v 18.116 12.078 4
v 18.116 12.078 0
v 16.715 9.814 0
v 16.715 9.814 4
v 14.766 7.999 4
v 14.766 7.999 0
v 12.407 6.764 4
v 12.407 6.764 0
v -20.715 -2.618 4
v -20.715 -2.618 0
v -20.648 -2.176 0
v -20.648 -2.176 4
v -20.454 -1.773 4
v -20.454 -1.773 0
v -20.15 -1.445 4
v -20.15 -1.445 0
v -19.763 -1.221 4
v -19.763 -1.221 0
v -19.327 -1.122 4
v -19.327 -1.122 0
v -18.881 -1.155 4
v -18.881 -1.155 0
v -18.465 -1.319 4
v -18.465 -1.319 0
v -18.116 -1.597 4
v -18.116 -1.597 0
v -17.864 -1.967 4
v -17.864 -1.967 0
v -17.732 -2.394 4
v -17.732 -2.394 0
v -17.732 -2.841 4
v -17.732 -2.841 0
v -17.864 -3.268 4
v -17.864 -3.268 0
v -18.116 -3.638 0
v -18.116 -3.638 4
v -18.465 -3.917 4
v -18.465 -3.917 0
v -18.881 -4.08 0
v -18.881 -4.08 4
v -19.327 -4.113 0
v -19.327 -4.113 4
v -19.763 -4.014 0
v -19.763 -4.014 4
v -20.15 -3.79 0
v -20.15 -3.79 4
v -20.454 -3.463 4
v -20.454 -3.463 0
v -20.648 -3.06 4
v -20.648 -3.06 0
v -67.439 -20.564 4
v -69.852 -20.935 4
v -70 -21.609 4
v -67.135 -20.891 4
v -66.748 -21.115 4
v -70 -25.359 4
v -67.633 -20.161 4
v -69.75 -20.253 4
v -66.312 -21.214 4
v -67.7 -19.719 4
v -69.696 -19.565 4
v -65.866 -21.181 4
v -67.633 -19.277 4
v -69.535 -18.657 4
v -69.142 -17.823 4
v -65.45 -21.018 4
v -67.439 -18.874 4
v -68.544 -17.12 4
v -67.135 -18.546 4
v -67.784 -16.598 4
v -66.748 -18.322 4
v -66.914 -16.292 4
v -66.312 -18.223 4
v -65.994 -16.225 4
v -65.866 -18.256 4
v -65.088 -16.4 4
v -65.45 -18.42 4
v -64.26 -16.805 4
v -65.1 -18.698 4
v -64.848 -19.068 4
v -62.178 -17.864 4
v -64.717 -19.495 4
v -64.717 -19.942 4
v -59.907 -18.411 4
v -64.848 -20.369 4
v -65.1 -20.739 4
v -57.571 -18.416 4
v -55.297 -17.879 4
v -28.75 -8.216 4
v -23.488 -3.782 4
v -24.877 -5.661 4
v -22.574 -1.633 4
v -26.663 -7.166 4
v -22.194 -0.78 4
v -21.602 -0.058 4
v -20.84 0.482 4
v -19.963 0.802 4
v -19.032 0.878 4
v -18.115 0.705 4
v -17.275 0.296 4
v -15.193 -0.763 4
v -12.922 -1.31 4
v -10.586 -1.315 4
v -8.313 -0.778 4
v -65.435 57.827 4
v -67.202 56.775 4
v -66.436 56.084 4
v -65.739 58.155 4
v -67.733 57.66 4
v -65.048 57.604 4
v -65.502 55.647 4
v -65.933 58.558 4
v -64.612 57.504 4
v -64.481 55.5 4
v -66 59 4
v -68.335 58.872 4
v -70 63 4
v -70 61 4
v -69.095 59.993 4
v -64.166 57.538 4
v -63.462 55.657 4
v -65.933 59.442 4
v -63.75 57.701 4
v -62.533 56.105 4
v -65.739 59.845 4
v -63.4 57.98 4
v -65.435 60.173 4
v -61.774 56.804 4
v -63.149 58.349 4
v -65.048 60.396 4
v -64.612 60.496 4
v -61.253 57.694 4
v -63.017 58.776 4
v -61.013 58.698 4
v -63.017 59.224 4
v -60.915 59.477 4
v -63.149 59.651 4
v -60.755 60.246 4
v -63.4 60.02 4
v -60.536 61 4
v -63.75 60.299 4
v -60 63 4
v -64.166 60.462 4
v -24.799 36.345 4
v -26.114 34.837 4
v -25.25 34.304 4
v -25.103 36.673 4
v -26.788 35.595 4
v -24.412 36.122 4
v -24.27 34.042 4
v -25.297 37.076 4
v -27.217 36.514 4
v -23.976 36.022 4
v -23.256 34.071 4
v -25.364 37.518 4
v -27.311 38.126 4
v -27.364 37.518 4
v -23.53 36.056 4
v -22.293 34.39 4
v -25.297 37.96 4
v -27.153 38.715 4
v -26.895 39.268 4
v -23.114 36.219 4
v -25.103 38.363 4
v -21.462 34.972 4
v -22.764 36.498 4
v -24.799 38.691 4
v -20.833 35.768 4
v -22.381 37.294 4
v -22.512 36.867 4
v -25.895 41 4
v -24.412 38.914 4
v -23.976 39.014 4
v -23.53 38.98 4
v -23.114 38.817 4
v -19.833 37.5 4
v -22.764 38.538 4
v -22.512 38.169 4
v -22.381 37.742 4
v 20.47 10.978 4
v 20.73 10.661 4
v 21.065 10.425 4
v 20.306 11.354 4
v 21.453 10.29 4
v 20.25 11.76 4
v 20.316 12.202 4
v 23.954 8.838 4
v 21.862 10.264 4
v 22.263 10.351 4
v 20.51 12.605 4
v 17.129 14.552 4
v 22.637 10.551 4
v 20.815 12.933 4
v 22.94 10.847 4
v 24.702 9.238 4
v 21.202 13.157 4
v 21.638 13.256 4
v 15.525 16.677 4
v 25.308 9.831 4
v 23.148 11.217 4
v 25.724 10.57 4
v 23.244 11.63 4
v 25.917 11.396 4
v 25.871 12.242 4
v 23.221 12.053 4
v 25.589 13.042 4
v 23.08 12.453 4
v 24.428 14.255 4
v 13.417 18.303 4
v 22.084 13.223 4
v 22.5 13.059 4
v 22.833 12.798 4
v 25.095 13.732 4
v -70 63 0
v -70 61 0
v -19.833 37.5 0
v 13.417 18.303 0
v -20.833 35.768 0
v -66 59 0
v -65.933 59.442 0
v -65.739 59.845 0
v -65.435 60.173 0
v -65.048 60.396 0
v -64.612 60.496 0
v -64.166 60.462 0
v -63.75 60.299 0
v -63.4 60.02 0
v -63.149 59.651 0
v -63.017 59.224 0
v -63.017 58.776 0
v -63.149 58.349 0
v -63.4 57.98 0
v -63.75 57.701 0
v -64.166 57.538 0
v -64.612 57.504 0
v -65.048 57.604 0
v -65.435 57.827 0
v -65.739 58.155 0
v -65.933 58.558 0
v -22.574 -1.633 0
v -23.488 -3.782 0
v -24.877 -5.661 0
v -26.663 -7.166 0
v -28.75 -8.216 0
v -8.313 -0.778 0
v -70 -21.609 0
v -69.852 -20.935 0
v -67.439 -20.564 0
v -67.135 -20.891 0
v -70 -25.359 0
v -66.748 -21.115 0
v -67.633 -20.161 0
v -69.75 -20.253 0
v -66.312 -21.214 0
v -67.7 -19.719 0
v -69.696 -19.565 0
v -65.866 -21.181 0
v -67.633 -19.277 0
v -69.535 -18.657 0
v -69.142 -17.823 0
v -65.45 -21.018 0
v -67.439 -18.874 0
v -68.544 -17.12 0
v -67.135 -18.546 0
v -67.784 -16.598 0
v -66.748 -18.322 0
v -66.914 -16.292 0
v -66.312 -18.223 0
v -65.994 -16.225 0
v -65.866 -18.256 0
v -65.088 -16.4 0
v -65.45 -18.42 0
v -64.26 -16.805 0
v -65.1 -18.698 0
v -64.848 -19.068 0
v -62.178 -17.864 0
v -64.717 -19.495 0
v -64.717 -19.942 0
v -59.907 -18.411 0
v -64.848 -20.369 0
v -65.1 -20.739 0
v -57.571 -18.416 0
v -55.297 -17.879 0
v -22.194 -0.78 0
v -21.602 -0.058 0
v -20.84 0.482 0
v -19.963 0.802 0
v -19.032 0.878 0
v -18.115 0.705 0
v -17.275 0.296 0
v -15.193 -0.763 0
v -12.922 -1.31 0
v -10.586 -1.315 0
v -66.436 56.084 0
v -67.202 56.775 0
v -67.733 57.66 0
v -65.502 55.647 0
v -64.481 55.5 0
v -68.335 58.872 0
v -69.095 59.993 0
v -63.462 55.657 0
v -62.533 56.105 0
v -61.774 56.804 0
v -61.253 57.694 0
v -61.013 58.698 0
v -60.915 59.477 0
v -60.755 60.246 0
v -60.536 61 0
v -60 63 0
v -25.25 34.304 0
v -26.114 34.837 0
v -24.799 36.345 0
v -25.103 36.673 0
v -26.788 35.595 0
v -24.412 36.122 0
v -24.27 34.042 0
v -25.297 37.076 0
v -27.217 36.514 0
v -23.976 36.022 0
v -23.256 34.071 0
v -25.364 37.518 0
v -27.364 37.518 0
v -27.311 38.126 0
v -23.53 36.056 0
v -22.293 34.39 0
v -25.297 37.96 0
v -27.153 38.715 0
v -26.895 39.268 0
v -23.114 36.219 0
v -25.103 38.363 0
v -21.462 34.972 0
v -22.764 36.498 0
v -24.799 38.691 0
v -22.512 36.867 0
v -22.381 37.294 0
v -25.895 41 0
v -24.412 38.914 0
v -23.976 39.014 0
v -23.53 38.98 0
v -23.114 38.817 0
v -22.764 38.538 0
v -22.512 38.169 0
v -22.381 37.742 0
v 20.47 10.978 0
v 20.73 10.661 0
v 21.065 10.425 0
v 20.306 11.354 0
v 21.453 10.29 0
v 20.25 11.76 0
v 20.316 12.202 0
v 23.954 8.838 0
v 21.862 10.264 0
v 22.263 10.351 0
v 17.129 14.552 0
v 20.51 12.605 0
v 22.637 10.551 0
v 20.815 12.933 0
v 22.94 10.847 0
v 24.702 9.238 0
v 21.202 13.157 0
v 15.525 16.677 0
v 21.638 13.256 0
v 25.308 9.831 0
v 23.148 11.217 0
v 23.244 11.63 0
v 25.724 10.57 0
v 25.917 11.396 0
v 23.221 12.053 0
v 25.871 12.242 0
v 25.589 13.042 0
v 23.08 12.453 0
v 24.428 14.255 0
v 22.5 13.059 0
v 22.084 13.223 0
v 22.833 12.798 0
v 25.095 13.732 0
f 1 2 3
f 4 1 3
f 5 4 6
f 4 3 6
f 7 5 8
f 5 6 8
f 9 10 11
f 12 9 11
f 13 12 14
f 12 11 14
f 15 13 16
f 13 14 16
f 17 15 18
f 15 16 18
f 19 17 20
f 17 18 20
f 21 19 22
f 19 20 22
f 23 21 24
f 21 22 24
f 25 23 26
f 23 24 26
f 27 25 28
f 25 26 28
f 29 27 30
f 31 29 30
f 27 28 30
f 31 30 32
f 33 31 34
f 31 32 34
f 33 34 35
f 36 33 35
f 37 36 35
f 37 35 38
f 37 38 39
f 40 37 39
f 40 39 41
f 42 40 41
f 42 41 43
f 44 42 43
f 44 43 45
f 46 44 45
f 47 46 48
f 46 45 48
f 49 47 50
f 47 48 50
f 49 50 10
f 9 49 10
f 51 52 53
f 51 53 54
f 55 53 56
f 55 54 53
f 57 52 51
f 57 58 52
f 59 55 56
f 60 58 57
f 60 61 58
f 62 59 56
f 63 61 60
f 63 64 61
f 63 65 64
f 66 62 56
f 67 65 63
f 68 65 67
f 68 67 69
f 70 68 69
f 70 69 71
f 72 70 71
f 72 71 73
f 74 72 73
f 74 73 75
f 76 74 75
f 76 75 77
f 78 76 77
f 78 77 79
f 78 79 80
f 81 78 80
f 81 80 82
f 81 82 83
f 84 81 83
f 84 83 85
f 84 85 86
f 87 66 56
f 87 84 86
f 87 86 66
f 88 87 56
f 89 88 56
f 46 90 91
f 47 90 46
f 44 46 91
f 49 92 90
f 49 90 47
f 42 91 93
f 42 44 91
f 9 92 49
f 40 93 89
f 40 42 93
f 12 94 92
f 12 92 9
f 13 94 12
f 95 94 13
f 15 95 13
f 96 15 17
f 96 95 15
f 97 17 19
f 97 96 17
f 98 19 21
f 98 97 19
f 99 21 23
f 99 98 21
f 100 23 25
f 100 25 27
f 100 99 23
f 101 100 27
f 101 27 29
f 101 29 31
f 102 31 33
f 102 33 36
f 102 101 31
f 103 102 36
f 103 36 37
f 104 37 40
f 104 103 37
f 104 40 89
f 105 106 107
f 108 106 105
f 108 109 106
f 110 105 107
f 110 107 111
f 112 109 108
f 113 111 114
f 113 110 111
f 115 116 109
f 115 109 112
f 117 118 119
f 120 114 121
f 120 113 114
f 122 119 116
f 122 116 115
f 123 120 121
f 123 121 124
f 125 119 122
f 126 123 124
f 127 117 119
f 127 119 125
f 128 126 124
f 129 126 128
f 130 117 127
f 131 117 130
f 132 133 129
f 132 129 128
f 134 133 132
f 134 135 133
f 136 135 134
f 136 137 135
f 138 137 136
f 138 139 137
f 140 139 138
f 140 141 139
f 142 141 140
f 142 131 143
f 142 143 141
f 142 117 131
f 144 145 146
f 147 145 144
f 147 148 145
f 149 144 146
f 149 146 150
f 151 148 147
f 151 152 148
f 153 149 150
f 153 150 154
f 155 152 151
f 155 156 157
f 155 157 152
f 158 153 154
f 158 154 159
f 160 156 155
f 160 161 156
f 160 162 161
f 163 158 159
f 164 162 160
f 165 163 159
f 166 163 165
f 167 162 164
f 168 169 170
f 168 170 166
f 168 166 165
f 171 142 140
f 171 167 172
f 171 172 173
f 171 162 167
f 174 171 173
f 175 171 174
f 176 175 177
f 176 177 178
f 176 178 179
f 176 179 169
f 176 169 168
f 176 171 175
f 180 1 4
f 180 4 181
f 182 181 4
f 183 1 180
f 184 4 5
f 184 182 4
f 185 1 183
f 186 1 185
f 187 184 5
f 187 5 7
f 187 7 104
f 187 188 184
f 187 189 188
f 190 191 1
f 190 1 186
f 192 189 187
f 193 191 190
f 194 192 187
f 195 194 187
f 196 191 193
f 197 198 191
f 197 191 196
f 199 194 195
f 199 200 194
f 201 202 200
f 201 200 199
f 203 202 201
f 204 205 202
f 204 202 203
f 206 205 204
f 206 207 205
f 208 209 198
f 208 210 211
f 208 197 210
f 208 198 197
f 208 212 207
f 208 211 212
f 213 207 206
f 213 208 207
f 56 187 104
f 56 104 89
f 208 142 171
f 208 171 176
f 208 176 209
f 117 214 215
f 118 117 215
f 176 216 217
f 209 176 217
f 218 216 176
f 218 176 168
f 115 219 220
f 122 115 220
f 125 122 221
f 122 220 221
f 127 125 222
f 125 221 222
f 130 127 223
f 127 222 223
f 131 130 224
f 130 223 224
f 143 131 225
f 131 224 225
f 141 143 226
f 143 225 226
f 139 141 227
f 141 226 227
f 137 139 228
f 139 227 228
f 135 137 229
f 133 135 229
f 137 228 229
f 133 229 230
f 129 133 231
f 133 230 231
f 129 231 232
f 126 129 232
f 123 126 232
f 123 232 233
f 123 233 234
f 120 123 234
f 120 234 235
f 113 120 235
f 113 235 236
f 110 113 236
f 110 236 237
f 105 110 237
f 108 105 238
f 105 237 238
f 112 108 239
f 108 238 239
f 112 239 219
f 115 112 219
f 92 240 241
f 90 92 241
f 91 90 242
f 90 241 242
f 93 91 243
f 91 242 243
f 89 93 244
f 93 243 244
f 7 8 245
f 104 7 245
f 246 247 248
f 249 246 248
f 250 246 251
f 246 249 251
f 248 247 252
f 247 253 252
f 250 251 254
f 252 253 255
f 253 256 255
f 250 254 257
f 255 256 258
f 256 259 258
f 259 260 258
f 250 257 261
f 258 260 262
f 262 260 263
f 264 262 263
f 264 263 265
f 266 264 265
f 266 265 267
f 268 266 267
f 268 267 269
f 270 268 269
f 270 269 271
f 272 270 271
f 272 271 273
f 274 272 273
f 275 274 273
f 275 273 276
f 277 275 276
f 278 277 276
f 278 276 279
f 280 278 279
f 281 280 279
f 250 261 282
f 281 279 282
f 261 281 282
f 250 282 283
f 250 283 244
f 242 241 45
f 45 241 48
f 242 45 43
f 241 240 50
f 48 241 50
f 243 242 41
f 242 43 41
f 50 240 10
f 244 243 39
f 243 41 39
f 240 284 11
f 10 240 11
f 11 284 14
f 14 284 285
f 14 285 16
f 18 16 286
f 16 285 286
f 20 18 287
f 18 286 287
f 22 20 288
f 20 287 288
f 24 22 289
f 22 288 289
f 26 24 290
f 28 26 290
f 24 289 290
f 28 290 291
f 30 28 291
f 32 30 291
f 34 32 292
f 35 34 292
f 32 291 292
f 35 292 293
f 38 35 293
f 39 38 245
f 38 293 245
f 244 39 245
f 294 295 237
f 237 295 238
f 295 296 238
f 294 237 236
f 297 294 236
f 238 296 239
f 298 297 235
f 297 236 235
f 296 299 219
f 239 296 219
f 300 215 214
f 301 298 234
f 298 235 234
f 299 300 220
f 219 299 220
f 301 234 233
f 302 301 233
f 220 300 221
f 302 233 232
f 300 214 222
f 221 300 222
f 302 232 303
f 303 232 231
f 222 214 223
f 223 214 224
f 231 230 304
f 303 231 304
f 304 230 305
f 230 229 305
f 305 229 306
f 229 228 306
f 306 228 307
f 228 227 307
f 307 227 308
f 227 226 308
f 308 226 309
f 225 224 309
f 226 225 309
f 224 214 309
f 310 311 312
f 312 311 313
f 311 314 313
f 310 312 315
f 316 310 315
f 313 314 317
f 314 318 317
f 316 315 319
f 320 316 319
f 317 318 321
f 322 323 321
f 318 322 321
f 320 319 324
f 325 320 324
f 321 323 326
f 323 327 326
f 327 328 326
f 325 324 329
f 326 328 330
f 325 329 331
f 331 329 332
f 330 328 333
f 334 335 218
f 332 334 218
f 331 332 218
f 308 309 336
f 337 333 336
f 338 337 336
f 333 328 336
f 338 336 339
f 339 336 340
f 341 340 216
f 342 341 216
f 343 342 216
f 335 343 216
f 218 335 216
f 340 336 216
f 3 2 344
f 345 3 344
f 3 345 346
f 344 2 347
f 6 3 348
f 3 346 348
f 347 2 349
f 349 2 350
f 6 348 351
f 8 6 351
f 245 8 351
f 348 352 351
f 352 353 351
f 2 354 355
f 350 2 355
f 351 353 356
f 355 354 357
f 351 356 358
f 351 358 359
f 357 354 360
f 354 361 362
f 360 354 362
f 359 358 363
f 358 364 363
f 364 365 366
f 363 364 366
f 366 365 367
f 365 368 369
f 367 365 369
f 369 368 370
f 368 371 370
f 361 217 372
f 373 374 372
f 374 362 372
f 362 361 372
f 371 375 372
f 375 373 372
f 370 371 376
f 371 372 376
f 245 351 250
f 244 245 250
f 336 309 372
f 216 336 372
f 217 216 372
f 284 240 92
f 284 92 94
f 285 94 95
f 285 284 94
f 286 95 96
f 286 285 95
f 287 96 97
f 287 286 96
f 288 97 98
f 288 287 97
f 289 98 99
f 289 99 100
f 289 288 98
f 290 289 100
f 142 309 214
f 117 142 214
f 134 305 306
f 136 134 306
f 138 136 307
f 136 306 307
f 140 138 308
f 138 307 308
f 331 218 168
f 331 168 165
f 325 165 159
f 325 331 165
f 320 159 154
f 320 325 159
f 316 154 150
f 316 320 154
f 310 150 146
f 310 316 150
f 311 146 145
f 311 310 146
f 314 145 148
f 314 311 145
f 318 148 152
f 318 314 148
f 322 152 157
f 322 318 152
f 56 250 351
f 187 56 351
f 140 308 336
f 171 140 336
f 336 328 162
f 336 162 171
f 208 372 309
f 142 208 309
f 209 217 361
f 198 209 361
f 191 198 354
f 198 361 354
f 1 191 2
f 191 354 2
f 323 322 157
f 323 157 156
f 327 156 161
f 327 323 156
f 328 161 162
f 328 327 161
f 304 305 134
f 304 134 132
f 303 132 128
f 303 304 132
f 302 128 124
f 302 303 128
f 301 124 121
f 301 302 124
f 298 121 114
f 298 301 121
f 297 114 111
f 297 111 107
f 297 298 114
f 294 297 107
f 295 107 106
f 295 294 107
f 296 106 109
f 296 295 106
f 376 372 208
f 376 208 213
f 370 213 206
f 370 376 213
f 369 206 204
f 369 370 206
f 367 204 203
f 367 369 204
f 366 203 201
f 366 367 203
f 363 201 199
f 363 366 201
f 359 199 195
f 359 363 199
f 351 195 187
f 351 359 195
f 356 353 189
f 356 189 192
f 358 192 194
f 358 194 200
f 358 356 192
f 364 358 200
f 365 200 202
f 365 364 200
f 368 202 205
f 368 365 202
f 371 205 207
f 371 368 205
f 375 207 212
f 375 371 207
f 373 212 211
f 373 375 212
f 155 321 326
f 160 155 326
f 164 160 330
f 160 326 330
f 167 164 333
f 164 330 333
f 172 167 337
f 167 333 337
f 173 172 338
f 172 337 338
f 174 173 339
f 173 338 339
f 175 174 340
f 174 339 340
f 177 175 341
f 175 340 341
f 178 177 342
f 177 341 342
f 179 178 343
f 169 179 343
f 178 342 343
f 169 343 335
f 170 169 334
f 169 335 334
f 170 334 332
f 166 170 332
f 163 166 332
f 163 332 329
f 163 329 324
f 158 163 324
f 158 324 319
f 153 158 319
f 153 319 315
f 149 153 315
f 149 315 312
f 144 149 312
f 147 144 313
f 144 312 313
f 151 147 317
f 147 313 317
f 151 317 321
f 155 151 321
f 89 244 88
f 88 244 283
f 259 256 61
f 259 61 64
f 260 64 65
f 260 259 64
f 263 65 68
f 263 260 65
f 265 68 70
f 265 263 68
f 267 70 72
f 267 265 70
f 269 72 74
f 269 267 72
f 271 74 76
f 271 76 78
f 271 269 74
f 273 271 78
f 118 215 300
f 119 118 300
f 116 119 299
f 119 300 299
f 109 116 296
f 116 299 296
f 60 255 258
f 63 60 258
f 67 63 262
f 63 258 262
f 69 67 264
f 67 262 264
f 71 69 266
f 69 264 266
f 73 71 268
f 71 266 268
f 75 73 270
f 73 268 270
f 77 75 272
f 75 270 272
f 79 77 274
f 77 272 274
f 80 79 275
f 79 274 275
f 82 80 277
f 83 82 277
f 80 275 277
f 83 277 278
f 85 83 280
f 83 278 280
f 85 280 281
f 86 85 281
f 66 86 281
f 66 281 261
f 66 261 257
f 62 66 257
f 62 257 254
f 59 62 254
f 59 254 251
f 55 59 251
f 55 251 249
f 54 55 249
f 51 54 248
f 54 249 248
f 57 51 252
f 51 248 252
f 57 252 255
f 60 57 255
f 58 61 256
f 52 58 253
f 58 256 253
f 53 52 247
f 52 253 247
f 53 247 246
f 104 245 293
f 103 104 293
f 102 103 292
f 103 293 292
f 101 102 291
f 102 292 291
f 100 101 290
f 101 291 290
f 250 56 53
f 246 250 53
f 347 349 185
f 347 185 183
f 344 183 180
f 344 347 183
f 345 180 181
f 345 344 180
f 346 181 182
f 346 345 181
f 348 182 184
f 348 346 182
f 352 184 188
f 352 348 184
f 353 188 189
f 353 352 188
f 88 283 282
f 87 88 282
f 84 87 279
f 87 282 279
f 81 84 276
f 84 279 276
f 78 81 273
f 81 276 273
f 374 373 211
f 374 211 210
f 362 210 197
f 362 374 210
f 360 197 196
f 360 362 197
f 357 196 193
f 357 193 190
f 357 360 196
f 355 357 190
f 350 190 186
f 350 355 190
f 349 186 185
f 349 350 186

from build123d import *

# Parameters (mm, degrees)
EXTRUDE_THIN1_DEPTH = 4
SKETCH2_R           = 1.5
BOSS_EXTRUDE1_DEPTH = 4
FILLET1_DEPTH       = 4
FILLET1_2_DEPTH     = 4
SKETCH3_W           = 3.133113898
SKETCH3_H           = 7.459824135
CUT_EXTRUDE1_DEPTH  = 95.769370322


with BuildPart() as part:
    # Sketch1 → Extrude-Thin1 (new body)
    with BuildSketch(Plane.XY):
        Polygon((-70, -25.358547654), (30, 11.038475773), (-60, 63), (-70, 63), (-70, 61), (-60.535898385, 61), (25.285605056, 11.450931886), (-70.684040287, -23.479162412), align=None)
    extrude(amount=EXTRUDE_THIN1_DEPTH)

    # Sketch2 → Boss-Extrude1 (add)
    # profile 1 of 17: a face of its own
    with BuildSketch(Plane(origin=(0, 0, 0), x_dir=(-1, 0, 0), z_dir=(0, 0, -1))):
        with BuildLine():
            ThreePointArc((69.699771159, -19.718666382), (66.807539781, -16.271839247), (62.910846986, -18.521595881))
            ThreePointArc((62.910846986, -18.521595881), (62.703305352, -19.561418618), (62.816669308, -20.615673554))
            Line((62.816669308, -20.615673554), (68.214792437, -22.580429694))
            ThreePointArc((68.214792437, -22.580429694), (68.979296275, -21.845692505), (69.488695332, -20.915736884))
            ThreePointArc((69.488695332, -20.915736884), (69.646598295, -20.326435004), (69.699771159, -19.718666382))
        make_face()
        with Locations((66.199771159, -19.718666382)):
            Circle(SKETCH2_R, mode=Mode.SUBTRACT)
    # profile 2 of 17: a face of its own
    with BuildSketch(Plane(origin=(0, 0, 0), x_dir=(-1, 0, 0), z_dir=(0, 0, -1))):
        with BuildLine():
            ThreePointArc((69.488695332, -20.915736884), (68.979296275, -21.845692505), (68.214792437, -22.580429694))
            Line((68.214792437, -22.580429694), (68.804655045, -22.795122125))
            Line((68.804655045, -22.795122125), (69.488695332, -20.915736884))
        make_face()
    # profile 3 of 17: a face of its own
    with BuildSketch(Plane(origin=(0, 0, 0), x_dir=(-1, 0, 0), z_dir=(0, 0, -1))):
        with BuildLine():
            Line((62.910846986, -18.521595881), (62.2268067, -20.400981122))
            Line((62.2268067, -20.400981122), (62.816669308, -20.615673554))
            ThreePointArc((62.816669308, -20.615673554), (62.703305352, -19.561418618), (62.910846986, -18.521595881))
        make_face()
    # profile 4 of 17: a face of its own
    with BuildSketch(Plane(origin=(0, 0, 0), x_dir=(-1, 0, 0), z_dir=(0, 0, -1))):
        with BuildLine():
            ThreePointArc((22.71514012, -2.617659216), (19.822908742, 0.82916792), (15.926215947, -1.420588714))
            ThreePointArc((15.926215947, -1.420588714), (15.718674313, -2.460411452), (15.832038269, -3.514666388))
            Line((15.832038269, -3.514666388), (21.230161397, -5.479422527))
            ThreePointArc((21.230161397, -5.479422527), (21.994665236, -4.744685339), (22.504064292, -3.814729718))
            ThreePointArc((22.504064292, -3.814729718), (22.661967255, -3.225427838), (22.71514012, -2.617659216))
        make_face()
        with Locations((19.21514012, -2.617659216)):
            Circle(SKETCH2_R, mode=Mode.SUBTRACT)
    # profile 5 of 17: a face of its own
    with BuildSketch(Plane(origin=(0, 0, 0), x_dir=(-1, 0, 0), z_dir=(0, 0, -1))):
        with BuildLine():
            ThreePointArc((22.504064292, -3.814729718), (21.994665236, -4.744685339), (21.230161397, -5.479422527))
            Line((21.230161397, -5.479422527), (21.820024006, -5.694114959))
            Line((21.820024006, -5.694114959), (22.504064292, -3.814729718))
        make_face()
    # profile 6 of 17: a face of its own
    with BuildSketch(Plane(origin=(0, 0, 0), x_dir=(-1, 0, 0), z_dir=(0, 0, -1))):
        with BuildLine():
            Line((15.926215947, -1.420588714), (15.24217566, -3.299973956))
            Line((15.24217566, -3.299973956), (15.832038269, -3.514666388))
            ThreePointArc((15.832038269, -3.514666388), (15.718674313, -2.460411452), (15.926215947, -1.420588714))
        make_face()
    # profile 7 of 17: a face of its own
    with BuildSketch(Plane(origin=(0, 0, 0), x_dir=(-1, 0, 0), z_dir=(0, 0, -1))):
        with BuildLine():
            ThreePointArc((-18.249808849, 11.760273971), (-18.650603728, 13.386597315), (-19.761196061, 14.640450906))
            Line((-19.761196061, 14.640450906), (-22.499808851, 13.059312075))
            ThreePointArc((-22.499808851, 13.059312075), (-20.99980885, 13.059312077), (-20.249808849, 11.760273971))
            ThreePointArc((-20.249808849, 11.760273971), (-20.889444174, 10.531545919), (-22.262839017, 10.350735022))
            Line((-22.262839017, 10.350735022), (-19.291270082, 9.269172381))
            ThreePointArc((-19.291270082, 9.269172381), (-18.520653721, 10.410252801), (-18.249808849, 11.760273971))
        make_face()
    # profile 8 of 17: a face of its own
    with BuildSketch(Plane(origin=(0, 0, 0), x_dir=(-1, 0, 0), z_dir=(0, 0, -1))):
        with BuildLine():
            Line((-22.499808851, 13.059312075), (-25.238421636, 11.478173246))
            ThreePointArc((-25.238421636, 11.478173246), (-25.236490292, 11.455228871), (-25.234408046, 11.432297698))
            Line((-25.234408046, 11.432297698), (-22.262839017, 10.350735022))
            ThreePointArc((-22.262839017, 10.350735022), (-23.244100894, 11.62954033), (-22.499808851, 13.059312075))
        make_face()
    # profile 9 of 17: a face of its own
    with BuildSketch(Plane(origin=(0, 0, 0), x_dir=(-1, 0, 0), z_dir=(0, 0, -1))):
        with BuildLine():
            ThreePointArc((-18.249808849, 11.760273971), (-18.650603728, 13.386597315), (-19.761196061, 14.640450906))
            Line((-19.761196061, 14.640450906), (-22.499808851, 13.059312075))
            ThreePointArc((-22.499808851, 13.059312075), (-20.99980885, 13.059312077), (-20.249808849, 11.760273971))
            ThreePointArc((-20.249808849, 11.760273971), (-20.889444174, 10.531545919), (-22.262839017, 10.350735022))
            Line((-22.262839017, 10.350735022), (-19.291270082, 9.269172381))
            ThreePointArc((-19.291270082, 9.269172381), (-18.520653721, 10.410252801), (-18.249808849, 11.760273971))
        make_face()
    # profile 10 of 17: a face of its own
    with BuildSketch(Plane(origin=(0, 0, 0), x_dir=(-1, 0, 0), z_dir=(0, 0, -1))):
        with BuildLine():
            Line((-22.499808851, 13.059312075), (-25.238421636, 11.478173246))
            ThreePointArc((-25.238421636, 11.478173246), (-25.236490292, 11.455228871), (-25.234408046, 11.432297698))
            Line((-25.234408046, 11.432297698), (-22.262839017, 10.350735022))
            ThreePointArc((-22.262839017, 10.350735022), (-23.244100894, 11.62954033), (-22.499808851, 13.059312075))
        make_face()
    # profile 11 of 17: a face of its own
    with BuildSketch(Plane(origin=(0, 0, 0), x_dir=(-1, 0, 0), z_dir=(0, 0, -1))):
        with BuildLine():
            ThreePointArc((-25.234408046, 11.432297698), (-25.236490292, 11.455228871), (-25.238421636, 11.478173246))
            Line((-25.238421636, 11.478173246), (-25.285605056, 11.450931886))
            Line((-25.285605056, 11.450931886), (-25.234408046, 11.432297698))
        make_face()
    # profile 12 of 17: a face of its own
    with BuildSketch(Plane(origin=(0, 0, 0), x_dir=(-1, 0, 0), z_dir=(0, 0, -1))):
        with BuildLine():
            ThreePointArc((27.36379332, 37.517949192), (27.244533712, 38.42381585), (26.894882233, 39.267949192))
            ThreePointArc((26.894882233, 39.267949192), (26.231736995, 40.09532048), (25.351261913, 40.686140662))
            Line((25.351261913, 40.686140662), (20.376324727, 37.813859338))
            ThreePointArc((20.376324727, 37.813859338), (20.447752473, 36.75593546), (20.832704407, 35.767949192))
            ThreePointArc((20.832704407, 35.767949192), (24.769659978, 34.1372088), (27.36379332, 37.517949192))
        make_face()
        with Locations((23.86379332, 37.517949192)):
            Circle(SKETCH2_R, mode=Mode.SUBTRACT)
    # profile 13 of 17: a face of its own
    with BuildSketch(Plane(origin=(0, 0, 0), x_dir=(-1, 0, 0), z_dir=(0, 0, -1))):
        with BuildLine():
            Line((26.894882233, 39.267949192), (25.894882233, 41))
            Line((25.894882233, 41), (25.351261913, 40.686140662))
            ThreePointArc((25.351261913, 40.686140662), (26.231736995, 40.09532048), (26.894882233, 39.267949192))
        make_face()
    # profile 14 of 17: a face of its own
    with BuildSketch(Plane(origin=(0, 0, 0), x_dir=(-1, 0, 0), z_dir=(0, 0, -1))):
        with BuildLine():
            ThreePointArc((20.832704407, 35.767949192), (20.447752473, 36.75593546), (20.376324727, 37.813859338))
            Line((20.376324727, 37.813859338), (19.832704407, 37.5))
            Line((19.832704407, 37.5), (20.832704407, 35.767949192))
        make_face()
    # profile 15 of 17: a face of its own
    with BuildSketch(Plane(origin=(0, 0, 0), x_dir=(-1, 0, 0), z_dir=(0, 0, -1))):
        with BuildLine():
            ThreePointArc((61, 59), (64.5, 55.5), (68, 59))
            ThreePointArc((68, 59), (67.839385021, 60.048097173), (67.372281323, 61))
            Line((67.372281323, 61), (61.627718677, 61))
            ThreePointArc((61.627718677, 61), (61.160614979, 60.048097173), (61, 59))
        make_face()
        with Locations((64.5, 59)):
            Circle(SKETCH2_R, mode=Mode.SUBTRACT)
    # profile 16 of 17: a face of its own
    with BuildSketch(Plane(origin=(0, 0, 0), x_dir=(-1, 0, 0), z_dir=(0, 0, -1))):
        with BuildLine():
            Line((61, 61), (61, 59))
            ThreePointArc((61, 59), (61.160614979, 60.048097173), (61.627718677, 61))
            Line((61.627718677, 61), (61, 61))
        make_face()
    # profile 17 of 17: a face of its own
    with BuildSketch(Plane(origin=(0, 0, 0), x_dir=(-1, 0, 0), z_dir=(0, 0, -1))):
        with BuildLine():
            ThreePointArc((67.372281323, 61), (67.839385021, 60.048097173), (68, 59))
            Line((68, 59), (68, 61))
            Line((68, 61), (67.372281323, 61))
        make_face()
    extrude(amount=-BOSS_EXTRUDE1_DEPTH)

    # Fillet1: read off the stored shape, not the designer's step
    # Fillet1 outline → Fillet1 (cut)
    with BuildSketch(Plane.XY):
        with BuildLine():
            Line((30, 11.038475773), (24.428407585, 14.255236154))
            ThreePointArc((24.428407585, 14.255236154), (25.916991679, 11.395692714), (23.954468015, 8.83808208))
            Line((23.954468015, 8.83808208), (30, 11.038475773))
        make_face()
    extrude(amount=FILLET1_DEPTH, mode=Mode.SUBTRACT)

    # Fillet1 2 outline → Fillet1 2 (add)
    with BuildSketch(Plane.XY):
        with BuildLine():
            ThreePointArc((13.416857787, 18.303356317), (16.398283352, 15.667788657), (18.115840977, 12.078204963))
            ThreePointArc((18.115840977, 12.078204963), (15.801052244, 8.841405863), (12.407259711, 6.763597514))
            Line((12.407259711, 6.763597514), (19.291270082, 9.269172381))
            ThreePointArc((19.291270082, 9.269172381), (18.263127406, 12.06531907), (19.761196061, 14.640450906))
            Line((19.761196061, 14.640450906), (13.416857787, 18.303356317))
        make_face()
        with BuildLine():
            ThreePointArc((-69.488695332, -20.915736884), (-69.65911424, -20.25059255), (-69.696395151, -19.564976241))
            ThreePointArc((-69.696395151, -19.564976241), (-69.990650839, -21.572424943), (-70.684040287, -23.479162412))
            Line((-70.684040287, -23.479162412), (-68.804655045, -22.795122125))
            Line((-68.804655045, -22.795122125), (-69.488695332, -20.915736884))
        make_face()
        with BuildLine():
            Line((-62.2268067, -20.400981122), (-55.29724871, -17.878828277))
            ThreePointArc((-55.29724871, -17.878828277), (-59.906584574, -18.410948313), (-64.259910155, -16.80543119))
            ThreePointArc((-64.259910155, -16.80543119), (-63.448161827, -17.555648564), (-62.910846986, -18.521595881))
            Line((-62.910846986, -18.521595881), (-62.2268067, -20.400981122))
        make_face()
        with BuildLine():
            ThreePointArc((-22.504064292, -3.814729718), (-22.713356211, -2.729391821), (-22.573751348, -1.632910203))
            ThreePointArc((-22.573751348, -1.632910203), (-24.876585704, -5.661071418), (-28.749581995, -8.216267804))
            Line((-28.749581995, -8.216267804), (-21.820024006, -5.694114959))
            Line((-21.820024006, -5.694114959), (-22.504064292, -3.814729718))
        make_face()
        with BuildLine():
            Line((-15.24217566, -3.299973956), (-8.312617671, -0.777821111))
            ThreePointArc((-8.312617671, -0.777821111), (-12.921953535, -1.309941147), (-17.275279116, 0.295575976))
            ThreePointArc((-17.275279116, 0.295575976), (-16.463530787, -0.454641397), (-15.926215947, -1.420588714))
            Line((-15.926215947, -1.420588714), (-15.24217566, -3.299973956))
        make_face()
        with BuildLine():
            ThreePointArc((-70, 61), (-68.69628443, 59.445406029), (-67.733186639, 57.65966267))
            ThreePointArc((-67.733186639, 57.65966267), (-67.93264863, 58.316682078), (-68, 59))
            Line((-68, 59), (-68, 61))
            Line((-68, 61), (-70, 61))
        make_face()
        with BuildLine():
            ThreePointArc((-61.013092006, 58.697555558), (-60.842404557, 59.862852348), (-60.535898385, 61))
            Line((-60.535898385, 61), (-61, 61))
            Line((-61, 61), (-61, 59))
            ThreePointArc((-61, 59), (-61.003274533, 58.848636166), (-61.013092006, 58.697555558))
        make_face()
    extrude(amount=FILLET1_2_DEPTH)

    # Sketch3 → Cut-Extrude1 (cut, through all)
    with BuildSketch(Plane.XY.offset(4)):
        with Locations((-71.566556949, -21.628635587)):
            Rectangle(SKETCH3_W, SKETCH3_H)
    extrude(amount=-CUT_EXTRUDE1_DEPTH, mode=Mode.SUBTRACT)


solid = part.part
